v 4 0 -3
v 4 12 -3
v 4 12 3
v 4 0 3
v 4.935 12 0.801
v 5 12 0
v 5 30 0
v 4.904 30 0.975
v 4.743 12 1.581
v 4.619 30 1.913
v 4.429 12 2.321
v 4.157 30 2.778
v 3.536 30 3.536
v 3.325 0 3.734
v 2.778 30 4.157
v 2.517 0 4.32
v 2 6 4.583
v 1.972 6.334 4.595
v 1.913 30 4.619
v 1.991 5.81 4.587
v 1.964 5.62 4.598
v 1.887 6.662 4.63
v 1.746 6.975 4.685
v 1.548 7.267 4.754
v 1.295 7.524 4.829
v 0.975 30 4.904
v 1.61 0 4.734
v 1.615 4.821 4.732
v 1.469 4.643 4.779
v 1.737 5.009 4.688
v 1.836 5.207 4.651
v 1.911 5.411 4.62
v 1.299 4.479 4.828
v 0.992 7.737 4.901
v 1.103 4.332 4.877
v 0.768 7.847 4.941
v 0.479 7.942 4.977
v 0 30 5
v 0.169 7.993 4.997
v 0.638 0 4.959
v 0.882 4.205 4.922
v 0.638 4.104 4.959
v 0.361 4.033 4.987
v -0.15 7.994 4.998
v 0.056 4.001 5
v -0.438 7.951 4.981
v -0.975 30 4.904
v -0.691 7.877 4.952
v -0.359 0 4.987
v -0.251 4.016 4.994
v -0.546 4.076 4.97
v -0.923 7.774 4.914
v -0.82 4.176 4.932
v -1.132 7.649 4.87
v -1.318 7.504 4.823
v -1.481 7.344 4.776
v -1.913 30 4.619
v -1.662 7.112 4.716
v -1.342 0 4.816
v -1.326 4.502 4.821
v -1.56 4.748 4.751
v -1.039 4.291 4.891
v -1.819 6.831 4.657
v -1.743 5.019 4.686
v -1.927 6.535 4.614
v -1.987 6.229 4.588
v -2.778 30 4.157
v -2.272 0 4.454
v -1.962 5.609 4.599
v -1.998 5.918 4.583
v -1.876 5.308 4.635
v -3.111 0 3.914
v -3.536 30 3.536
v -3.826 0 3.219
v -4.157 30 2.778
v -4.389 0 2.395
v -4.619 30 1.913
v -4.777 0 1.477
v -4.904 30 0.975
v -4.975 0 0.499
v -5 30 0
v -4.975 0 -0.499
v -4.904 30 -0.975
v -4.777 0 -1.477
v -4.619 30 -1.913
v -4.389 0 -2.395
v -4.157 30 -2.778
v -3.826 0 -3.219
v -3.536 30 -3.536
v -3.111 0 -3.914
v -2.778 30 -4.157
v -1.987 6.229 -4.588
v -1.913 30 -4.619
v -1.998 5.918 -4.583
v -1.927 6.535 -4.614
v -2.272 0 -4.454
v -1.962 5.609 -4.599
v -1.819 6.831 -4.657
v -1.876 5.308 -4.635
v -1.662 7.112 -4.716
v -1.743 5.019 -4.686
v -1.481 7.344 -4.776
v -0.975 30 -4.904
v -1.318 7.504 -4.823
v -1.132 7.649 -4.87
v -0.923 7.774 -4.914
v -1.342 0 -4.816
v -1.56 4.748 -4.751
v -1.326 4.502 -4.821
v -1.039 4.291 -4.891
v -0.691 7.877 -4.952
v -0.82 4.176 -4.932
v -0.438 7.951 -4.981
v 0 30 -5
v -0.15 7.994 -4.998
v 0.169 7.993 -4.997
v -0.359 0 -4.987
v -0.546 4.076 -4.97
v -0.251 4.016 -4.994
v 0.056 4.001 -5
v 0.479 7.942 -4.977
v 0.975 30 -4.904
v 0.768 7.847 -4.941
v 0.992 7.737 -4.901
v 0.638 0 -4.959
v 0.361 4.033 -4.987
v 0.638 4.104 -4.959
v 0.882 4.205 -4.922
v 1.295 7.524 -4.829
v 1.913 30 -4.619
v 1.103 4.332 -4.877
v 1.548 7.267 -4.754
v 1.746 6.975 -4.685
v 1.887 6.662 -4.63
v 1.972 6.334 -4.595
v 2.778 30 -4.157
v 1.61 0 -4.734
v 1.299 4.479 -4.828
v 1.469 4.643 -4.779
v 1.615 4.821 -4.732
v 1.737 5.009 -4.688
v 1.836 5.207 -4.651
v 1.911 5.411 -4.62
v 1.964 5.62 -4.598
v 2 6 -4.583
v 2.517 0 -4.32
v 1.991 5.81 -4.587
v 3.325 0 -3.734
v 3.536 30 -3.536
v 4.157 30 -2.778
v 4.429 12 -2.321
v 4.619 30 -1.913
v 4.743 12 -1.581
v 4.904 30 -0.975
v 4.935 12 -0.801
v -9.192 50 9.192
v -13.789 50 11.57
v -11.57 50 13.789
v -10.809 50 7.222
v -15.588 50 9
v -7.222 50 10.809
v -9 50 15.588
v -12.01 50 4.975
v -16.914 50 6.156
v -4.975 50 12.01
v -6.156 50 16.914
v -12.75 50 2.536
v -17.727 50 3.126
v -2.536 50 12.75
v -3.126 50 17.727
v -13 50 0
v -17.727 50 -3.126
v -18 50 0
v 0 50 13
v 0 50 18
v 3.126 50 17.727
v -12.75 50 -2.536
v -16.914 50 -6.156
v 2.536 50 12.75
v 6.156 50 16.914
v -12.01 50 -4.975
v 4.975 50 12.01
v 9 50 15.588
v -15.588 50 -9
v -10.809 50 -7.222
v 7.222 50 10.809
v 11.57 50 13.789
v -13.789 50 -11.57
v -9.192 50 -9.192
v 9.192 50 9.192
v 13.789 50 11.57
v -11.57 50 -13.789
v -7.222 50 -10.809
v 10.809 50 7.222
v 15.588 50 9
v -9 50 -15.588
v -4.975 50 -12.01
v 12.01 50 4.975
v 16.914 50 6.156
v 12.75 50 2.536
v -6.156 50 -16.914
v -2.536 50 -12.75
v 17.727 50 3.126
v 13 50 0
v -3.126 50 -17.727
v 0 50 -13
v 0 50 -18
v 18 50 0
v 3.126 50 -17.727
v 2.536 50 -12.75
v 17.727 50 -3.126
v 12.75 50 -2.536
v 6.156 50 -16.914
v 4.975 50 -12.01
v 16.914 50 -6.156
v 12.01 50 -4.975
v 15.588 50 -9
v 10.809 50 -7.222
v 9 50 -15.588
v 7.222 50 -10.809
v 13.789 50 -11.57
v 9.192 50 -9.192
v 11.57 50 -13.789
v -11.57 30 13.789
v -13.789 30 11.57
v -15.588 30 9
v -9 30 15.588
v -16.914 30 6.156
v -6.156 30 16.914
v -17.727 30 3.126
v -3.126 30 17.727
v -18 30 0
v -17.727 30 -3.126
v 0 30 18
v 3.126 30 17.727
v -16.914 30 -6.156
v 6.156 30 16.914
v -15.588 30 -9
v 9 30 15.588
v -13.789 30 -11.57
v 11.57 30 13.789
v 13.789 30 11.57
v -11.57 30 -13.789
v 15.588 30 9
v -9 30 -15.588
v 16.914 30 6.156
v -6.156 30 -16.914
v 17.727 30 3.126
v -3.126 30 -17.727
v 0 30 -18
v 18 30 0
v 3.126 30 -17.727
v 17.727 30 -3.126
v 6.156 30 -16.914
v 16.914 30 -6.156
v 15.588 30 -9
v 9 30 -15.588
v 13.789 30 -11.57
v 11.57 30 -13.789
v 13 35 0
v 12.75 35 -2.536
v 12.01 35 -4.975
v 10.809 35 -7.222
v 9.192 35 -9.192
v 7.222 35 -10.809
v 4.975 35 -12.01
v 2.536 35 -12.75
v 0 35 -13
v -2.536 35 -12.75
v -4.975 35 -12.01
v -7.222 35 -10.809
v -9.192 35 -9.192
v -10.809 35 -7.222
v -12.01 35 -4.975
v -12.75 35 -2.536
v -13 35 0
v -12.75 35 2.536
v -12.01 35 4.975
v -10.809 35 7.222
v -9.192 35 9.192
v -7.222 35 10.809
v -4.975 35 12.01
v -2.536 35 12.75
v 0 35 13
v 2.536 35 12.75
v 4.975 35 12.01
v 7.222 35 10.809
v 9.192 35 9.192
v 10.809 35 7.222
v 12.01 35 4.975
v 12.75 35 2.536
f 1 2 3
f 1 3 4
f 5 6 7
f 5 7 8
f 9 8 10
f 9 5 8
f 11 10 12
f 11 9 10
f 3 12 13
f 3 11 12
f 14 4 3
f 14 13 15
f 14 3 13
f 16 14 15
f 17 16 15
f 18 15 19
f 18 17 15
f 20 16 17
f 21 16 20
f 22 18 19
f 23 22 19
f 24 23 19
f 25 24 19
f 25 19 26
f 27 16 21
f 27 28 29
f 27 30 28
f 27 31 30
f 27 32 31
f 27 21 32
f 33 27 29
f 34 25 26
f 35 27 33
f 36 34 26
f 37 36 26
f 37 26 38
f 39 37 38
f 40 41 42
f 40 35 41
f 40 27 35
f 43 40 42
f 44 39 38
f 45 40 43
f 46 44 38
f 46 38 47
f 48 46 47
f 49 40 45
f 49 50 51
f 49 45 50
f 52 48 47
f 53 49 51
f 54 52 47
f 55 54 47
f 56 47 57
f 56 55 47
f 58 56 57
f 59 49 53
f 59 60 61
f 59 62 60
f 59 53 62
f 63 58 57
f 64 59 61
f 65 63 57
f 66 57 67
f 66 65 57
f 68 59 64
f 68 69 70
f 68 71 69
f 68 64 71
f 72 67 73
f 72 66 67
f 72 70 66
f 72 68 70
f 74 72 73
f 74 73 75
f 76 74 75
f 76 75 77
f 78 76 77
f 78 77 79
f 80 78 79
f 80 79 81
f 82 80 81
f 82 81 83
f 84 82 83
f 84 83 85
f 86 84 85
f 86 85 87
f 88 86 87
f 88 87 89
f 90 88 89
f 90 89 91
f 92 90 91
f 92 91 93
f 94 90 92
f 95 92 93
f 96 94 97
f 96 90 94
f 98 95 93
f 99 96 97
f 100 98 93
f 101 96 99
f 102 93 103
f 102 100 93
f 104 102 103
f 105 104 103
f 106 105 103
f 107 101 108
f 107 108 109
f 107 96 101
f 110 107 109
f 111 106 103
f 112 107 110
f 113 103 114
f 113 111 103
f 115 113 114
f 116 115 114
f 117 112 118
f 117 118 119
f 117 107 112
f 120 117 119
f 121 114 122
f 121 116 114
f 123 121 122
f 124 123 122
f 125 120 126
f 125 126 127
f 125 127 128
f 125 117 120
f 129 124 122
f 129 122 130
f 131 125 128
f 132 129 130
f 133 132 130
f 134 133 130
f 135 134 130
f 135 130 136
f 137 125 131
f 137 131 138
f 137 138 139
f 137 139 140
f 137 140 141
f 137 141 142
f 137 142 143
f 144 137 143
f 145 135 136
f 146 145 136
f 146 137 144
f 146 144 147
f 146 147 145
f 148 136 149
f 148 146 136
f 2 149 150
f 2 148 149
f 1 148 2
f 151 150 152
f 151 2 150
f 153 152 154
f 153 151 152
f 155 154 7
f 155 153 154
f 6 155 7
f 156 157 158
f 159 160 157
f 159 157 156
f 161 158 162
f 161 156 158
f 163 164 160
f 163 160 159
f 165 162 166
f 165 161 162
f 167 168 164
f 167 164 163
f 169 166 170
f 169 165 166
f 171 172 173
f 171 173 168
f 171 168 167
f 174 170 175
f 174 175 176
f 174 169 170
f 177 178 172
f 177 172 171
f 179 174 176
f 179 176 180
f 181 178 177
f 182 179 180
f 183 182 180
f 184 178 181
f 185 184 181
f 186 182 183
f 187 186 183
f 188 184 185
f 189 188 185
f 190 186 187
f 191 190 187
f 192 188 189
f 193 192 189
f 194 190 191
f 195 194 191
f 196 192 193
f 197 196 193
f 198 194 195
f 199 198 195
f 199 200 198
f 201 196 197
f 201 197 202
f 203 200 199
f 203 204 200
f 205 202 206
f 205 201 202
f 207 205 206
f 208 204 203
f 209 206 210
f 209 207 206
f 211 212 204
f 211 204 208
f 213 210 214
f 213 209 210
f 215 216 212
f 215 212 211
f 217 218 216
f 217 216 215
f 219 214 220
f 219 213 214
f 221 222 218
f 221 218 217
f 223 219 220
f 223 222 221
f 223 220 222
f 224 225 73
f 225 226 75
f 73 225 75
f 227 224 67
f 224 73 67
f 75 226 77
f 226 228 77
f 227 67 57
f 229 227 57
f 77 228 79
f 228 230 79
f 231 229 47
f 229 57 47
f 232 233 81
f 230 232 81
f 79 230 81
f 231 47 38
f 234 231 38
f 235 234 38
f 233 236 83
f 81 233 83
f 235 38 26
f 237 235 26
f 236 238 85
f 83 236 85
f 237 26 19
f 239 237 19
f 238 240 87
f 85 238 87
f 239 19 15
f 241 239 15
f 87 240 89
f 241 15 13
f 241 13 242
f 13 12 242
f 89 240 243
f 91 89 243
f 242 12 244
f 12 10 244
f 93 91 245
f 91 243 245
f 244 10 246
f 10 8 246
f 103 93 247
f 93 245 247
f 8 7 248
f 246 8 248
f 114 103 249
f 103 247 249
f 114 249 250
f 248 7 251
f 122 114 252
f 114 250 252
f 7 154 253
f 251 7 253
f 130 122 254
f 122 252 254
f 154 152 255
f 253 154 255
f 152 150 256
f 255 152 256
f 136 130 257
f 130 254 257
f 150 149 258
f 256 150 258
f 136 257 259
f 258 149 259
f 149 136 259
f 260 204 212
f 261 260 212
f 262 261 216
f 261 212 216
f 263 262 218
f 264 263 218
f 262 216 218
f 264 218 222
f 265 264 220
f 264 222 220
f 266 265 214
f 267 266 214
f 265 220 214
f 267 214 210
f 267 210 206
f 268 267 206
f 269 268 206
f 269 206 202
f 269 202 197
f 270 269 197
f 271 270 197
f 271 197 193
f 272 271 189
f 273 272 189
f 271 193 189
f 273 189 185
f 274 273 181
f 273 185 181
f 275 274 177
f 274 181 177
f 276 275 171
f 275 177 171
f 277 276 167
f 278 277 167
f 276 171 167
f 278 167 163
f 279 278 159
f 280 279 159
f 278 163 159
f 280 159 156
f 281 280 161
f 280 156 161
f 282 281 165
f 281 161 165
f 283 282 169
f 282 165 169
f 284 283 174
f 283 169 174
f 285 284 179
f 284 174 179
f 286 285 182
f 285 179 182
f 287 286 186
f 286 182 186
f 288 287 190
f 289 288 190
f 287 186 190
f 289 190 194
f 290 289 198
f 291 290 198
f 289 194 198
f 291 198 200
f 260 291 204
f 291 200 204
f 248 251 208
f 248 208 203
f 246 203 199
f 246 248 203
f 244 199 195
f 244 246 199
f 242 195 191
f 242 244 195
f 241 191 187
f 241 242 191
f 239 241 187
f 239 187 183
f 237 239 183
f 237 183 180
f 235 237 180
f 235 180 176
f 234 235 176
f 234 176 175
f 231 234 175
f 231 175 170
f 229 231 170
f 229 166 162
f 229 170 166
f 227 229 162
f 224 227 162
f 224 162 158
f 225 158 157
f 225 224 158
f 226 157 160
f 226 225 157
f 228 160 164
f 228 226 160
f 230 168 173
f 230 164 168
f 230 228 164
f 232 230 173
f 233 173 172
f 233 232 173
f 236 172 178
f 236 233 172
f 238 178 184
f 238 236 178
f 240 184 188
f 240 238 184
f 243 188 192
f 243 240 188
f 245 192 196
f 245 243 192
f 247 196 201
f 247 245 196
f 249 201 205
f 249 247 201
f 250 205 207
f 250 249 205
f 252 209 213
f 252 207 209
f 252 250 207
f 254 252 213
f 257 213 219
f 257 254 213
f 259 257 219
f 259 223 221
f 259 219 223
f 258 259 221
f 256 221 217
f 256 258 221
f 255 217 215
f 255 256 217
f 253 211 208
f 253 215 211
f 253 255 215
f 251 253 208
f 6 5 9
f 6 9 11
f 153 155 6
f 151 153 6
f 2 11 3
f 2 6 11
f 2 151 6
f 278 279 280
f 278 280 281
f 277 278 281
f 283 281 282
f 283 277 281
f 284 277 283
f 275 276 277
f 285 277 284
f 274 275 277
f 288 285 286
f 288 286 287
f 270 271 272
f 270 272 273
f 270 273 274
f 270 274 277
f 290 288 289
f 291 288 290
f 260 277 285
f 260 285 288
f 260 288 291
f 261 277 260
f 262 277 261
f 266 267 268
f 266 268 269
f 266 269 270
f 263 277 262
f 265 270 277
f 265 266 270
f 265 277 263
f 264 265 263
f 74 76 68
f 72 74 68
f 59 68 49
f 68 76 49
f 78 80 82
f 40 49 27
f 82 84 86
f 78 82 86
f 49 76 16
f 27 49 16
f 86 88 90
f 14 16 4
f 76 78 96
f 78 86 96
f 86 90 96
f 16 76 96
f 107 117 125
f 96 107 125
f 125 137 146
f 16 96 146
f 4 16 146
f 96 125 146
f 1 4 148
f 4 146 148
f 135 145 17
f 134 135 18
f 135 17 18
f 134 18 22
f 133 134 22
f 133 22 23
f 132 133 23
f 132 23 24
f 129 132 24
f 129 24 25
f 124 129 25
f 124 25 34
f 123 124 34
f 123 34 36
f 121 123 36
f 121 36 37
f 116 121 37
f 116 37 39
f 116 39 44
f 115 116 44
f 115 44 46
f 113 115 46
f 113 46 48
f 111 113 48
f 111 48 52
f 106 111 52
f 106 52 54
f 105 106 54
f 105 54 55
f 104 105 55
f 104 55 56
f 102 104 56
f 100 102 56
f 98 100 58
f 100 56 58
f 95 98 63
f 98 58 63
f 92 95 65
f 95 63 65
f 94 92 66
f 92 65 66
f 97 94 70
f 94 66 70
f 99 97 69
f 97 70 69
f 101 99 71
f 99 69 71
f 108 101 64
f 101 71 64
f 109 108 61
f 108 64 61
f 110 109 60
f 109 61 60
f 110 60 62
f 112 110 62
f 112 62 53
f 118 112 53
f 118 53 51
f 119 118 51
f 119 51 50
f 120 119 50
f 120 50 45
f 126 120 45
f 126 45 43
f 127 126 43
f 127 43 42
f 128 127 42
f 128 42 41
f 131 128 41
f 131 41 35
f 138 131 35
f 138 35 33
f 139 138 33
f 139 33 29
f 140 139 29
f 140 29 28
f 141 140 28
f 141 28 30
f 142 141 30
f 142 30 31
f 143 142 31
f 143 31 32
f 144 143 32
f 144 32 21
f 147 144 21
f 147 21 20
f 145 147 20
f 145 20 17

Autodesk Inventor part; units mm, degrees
ref_plane "YZ Plane" through (0, 0, 0) normal (1, 0, 0) x (0, 1, 0)
ref_plane "XZ Plane" through (0, 0, 0) normal (0, 1, 0) x (-1, 0, 0)
ref_plane "XY Plane" through (0, 0, 0) normal (0, 0, 1) x (1, 0, 0)
sketch "Sketch1" plane through (0, 0, 0) normal (0, 0, 1) x (1, 0, 0)
  line L0 (0, 0) -> (0, 50)
  line L1 (0, 50) -> (18, 50)
  line L2 (18, 50) -> (18, 30)
  line L3 (18, 30) -> (5, 30)
  line L4 (5, 30) -> (5, 0)
  line L5 (5, 0) -> (0, 0)
  dimension "d0" = 50
  dimension "d1" = 18
  dimension "d2" = 20
  dimension "d3" = 13
revolve "Revolution1" add sketch "Sketch1" angle 360 about axis through (0, 0, 0) along (0, 1, 0)
sketch "Sketch2" plane through (0, 50, 0) normal (0, 1, 0) x (1, 0, 0)
  circle A0 centre (0, 0) radius 18 projected
  circle A1 centre (0, 0) radius 13
  dimension "d5" = 5
extrude "Extrusion1" cut sketch "Sketch2" against normal blind 15 contours A1
sketch "Sketch3" plane through (0, 0, 0) normal (0, 0, 1) x (1, 0, 0)
  line L0 (5, 0) -> (-5, 0) projected
  line L1 (5, 12) -> (-5, 12)
  line L2 (5, 12) -> (4, 12)
  line L3 (4, 12) -> (4, 0)
  line L4 (4, 0) -> (5, 0)
  line L5 (5, 0) -> (5, 12)
  point P0 (0, 0)
  dimension "d8" = 12
extrude "Extrusion2" cut sketch "Sketch3" along normal through all both and the other way through all
sketch "Sketch4" plane through (0, 0, 0) normal (0, 0, 1) x (1, 0, 0)
  line L0 (4, 0) -> (-5, 0) projected
  circle A0 centre (0, 6) radius 2
  point P0 (0, 0)
  dimension "d11" = 6
  dimension "d12" = 4
extrude "Extrusion3" cut sketch "Sketch4" along normal through all both and the other way through all
properties part number "shellerAdapter" material "Stainless Steel, Austenitic"
